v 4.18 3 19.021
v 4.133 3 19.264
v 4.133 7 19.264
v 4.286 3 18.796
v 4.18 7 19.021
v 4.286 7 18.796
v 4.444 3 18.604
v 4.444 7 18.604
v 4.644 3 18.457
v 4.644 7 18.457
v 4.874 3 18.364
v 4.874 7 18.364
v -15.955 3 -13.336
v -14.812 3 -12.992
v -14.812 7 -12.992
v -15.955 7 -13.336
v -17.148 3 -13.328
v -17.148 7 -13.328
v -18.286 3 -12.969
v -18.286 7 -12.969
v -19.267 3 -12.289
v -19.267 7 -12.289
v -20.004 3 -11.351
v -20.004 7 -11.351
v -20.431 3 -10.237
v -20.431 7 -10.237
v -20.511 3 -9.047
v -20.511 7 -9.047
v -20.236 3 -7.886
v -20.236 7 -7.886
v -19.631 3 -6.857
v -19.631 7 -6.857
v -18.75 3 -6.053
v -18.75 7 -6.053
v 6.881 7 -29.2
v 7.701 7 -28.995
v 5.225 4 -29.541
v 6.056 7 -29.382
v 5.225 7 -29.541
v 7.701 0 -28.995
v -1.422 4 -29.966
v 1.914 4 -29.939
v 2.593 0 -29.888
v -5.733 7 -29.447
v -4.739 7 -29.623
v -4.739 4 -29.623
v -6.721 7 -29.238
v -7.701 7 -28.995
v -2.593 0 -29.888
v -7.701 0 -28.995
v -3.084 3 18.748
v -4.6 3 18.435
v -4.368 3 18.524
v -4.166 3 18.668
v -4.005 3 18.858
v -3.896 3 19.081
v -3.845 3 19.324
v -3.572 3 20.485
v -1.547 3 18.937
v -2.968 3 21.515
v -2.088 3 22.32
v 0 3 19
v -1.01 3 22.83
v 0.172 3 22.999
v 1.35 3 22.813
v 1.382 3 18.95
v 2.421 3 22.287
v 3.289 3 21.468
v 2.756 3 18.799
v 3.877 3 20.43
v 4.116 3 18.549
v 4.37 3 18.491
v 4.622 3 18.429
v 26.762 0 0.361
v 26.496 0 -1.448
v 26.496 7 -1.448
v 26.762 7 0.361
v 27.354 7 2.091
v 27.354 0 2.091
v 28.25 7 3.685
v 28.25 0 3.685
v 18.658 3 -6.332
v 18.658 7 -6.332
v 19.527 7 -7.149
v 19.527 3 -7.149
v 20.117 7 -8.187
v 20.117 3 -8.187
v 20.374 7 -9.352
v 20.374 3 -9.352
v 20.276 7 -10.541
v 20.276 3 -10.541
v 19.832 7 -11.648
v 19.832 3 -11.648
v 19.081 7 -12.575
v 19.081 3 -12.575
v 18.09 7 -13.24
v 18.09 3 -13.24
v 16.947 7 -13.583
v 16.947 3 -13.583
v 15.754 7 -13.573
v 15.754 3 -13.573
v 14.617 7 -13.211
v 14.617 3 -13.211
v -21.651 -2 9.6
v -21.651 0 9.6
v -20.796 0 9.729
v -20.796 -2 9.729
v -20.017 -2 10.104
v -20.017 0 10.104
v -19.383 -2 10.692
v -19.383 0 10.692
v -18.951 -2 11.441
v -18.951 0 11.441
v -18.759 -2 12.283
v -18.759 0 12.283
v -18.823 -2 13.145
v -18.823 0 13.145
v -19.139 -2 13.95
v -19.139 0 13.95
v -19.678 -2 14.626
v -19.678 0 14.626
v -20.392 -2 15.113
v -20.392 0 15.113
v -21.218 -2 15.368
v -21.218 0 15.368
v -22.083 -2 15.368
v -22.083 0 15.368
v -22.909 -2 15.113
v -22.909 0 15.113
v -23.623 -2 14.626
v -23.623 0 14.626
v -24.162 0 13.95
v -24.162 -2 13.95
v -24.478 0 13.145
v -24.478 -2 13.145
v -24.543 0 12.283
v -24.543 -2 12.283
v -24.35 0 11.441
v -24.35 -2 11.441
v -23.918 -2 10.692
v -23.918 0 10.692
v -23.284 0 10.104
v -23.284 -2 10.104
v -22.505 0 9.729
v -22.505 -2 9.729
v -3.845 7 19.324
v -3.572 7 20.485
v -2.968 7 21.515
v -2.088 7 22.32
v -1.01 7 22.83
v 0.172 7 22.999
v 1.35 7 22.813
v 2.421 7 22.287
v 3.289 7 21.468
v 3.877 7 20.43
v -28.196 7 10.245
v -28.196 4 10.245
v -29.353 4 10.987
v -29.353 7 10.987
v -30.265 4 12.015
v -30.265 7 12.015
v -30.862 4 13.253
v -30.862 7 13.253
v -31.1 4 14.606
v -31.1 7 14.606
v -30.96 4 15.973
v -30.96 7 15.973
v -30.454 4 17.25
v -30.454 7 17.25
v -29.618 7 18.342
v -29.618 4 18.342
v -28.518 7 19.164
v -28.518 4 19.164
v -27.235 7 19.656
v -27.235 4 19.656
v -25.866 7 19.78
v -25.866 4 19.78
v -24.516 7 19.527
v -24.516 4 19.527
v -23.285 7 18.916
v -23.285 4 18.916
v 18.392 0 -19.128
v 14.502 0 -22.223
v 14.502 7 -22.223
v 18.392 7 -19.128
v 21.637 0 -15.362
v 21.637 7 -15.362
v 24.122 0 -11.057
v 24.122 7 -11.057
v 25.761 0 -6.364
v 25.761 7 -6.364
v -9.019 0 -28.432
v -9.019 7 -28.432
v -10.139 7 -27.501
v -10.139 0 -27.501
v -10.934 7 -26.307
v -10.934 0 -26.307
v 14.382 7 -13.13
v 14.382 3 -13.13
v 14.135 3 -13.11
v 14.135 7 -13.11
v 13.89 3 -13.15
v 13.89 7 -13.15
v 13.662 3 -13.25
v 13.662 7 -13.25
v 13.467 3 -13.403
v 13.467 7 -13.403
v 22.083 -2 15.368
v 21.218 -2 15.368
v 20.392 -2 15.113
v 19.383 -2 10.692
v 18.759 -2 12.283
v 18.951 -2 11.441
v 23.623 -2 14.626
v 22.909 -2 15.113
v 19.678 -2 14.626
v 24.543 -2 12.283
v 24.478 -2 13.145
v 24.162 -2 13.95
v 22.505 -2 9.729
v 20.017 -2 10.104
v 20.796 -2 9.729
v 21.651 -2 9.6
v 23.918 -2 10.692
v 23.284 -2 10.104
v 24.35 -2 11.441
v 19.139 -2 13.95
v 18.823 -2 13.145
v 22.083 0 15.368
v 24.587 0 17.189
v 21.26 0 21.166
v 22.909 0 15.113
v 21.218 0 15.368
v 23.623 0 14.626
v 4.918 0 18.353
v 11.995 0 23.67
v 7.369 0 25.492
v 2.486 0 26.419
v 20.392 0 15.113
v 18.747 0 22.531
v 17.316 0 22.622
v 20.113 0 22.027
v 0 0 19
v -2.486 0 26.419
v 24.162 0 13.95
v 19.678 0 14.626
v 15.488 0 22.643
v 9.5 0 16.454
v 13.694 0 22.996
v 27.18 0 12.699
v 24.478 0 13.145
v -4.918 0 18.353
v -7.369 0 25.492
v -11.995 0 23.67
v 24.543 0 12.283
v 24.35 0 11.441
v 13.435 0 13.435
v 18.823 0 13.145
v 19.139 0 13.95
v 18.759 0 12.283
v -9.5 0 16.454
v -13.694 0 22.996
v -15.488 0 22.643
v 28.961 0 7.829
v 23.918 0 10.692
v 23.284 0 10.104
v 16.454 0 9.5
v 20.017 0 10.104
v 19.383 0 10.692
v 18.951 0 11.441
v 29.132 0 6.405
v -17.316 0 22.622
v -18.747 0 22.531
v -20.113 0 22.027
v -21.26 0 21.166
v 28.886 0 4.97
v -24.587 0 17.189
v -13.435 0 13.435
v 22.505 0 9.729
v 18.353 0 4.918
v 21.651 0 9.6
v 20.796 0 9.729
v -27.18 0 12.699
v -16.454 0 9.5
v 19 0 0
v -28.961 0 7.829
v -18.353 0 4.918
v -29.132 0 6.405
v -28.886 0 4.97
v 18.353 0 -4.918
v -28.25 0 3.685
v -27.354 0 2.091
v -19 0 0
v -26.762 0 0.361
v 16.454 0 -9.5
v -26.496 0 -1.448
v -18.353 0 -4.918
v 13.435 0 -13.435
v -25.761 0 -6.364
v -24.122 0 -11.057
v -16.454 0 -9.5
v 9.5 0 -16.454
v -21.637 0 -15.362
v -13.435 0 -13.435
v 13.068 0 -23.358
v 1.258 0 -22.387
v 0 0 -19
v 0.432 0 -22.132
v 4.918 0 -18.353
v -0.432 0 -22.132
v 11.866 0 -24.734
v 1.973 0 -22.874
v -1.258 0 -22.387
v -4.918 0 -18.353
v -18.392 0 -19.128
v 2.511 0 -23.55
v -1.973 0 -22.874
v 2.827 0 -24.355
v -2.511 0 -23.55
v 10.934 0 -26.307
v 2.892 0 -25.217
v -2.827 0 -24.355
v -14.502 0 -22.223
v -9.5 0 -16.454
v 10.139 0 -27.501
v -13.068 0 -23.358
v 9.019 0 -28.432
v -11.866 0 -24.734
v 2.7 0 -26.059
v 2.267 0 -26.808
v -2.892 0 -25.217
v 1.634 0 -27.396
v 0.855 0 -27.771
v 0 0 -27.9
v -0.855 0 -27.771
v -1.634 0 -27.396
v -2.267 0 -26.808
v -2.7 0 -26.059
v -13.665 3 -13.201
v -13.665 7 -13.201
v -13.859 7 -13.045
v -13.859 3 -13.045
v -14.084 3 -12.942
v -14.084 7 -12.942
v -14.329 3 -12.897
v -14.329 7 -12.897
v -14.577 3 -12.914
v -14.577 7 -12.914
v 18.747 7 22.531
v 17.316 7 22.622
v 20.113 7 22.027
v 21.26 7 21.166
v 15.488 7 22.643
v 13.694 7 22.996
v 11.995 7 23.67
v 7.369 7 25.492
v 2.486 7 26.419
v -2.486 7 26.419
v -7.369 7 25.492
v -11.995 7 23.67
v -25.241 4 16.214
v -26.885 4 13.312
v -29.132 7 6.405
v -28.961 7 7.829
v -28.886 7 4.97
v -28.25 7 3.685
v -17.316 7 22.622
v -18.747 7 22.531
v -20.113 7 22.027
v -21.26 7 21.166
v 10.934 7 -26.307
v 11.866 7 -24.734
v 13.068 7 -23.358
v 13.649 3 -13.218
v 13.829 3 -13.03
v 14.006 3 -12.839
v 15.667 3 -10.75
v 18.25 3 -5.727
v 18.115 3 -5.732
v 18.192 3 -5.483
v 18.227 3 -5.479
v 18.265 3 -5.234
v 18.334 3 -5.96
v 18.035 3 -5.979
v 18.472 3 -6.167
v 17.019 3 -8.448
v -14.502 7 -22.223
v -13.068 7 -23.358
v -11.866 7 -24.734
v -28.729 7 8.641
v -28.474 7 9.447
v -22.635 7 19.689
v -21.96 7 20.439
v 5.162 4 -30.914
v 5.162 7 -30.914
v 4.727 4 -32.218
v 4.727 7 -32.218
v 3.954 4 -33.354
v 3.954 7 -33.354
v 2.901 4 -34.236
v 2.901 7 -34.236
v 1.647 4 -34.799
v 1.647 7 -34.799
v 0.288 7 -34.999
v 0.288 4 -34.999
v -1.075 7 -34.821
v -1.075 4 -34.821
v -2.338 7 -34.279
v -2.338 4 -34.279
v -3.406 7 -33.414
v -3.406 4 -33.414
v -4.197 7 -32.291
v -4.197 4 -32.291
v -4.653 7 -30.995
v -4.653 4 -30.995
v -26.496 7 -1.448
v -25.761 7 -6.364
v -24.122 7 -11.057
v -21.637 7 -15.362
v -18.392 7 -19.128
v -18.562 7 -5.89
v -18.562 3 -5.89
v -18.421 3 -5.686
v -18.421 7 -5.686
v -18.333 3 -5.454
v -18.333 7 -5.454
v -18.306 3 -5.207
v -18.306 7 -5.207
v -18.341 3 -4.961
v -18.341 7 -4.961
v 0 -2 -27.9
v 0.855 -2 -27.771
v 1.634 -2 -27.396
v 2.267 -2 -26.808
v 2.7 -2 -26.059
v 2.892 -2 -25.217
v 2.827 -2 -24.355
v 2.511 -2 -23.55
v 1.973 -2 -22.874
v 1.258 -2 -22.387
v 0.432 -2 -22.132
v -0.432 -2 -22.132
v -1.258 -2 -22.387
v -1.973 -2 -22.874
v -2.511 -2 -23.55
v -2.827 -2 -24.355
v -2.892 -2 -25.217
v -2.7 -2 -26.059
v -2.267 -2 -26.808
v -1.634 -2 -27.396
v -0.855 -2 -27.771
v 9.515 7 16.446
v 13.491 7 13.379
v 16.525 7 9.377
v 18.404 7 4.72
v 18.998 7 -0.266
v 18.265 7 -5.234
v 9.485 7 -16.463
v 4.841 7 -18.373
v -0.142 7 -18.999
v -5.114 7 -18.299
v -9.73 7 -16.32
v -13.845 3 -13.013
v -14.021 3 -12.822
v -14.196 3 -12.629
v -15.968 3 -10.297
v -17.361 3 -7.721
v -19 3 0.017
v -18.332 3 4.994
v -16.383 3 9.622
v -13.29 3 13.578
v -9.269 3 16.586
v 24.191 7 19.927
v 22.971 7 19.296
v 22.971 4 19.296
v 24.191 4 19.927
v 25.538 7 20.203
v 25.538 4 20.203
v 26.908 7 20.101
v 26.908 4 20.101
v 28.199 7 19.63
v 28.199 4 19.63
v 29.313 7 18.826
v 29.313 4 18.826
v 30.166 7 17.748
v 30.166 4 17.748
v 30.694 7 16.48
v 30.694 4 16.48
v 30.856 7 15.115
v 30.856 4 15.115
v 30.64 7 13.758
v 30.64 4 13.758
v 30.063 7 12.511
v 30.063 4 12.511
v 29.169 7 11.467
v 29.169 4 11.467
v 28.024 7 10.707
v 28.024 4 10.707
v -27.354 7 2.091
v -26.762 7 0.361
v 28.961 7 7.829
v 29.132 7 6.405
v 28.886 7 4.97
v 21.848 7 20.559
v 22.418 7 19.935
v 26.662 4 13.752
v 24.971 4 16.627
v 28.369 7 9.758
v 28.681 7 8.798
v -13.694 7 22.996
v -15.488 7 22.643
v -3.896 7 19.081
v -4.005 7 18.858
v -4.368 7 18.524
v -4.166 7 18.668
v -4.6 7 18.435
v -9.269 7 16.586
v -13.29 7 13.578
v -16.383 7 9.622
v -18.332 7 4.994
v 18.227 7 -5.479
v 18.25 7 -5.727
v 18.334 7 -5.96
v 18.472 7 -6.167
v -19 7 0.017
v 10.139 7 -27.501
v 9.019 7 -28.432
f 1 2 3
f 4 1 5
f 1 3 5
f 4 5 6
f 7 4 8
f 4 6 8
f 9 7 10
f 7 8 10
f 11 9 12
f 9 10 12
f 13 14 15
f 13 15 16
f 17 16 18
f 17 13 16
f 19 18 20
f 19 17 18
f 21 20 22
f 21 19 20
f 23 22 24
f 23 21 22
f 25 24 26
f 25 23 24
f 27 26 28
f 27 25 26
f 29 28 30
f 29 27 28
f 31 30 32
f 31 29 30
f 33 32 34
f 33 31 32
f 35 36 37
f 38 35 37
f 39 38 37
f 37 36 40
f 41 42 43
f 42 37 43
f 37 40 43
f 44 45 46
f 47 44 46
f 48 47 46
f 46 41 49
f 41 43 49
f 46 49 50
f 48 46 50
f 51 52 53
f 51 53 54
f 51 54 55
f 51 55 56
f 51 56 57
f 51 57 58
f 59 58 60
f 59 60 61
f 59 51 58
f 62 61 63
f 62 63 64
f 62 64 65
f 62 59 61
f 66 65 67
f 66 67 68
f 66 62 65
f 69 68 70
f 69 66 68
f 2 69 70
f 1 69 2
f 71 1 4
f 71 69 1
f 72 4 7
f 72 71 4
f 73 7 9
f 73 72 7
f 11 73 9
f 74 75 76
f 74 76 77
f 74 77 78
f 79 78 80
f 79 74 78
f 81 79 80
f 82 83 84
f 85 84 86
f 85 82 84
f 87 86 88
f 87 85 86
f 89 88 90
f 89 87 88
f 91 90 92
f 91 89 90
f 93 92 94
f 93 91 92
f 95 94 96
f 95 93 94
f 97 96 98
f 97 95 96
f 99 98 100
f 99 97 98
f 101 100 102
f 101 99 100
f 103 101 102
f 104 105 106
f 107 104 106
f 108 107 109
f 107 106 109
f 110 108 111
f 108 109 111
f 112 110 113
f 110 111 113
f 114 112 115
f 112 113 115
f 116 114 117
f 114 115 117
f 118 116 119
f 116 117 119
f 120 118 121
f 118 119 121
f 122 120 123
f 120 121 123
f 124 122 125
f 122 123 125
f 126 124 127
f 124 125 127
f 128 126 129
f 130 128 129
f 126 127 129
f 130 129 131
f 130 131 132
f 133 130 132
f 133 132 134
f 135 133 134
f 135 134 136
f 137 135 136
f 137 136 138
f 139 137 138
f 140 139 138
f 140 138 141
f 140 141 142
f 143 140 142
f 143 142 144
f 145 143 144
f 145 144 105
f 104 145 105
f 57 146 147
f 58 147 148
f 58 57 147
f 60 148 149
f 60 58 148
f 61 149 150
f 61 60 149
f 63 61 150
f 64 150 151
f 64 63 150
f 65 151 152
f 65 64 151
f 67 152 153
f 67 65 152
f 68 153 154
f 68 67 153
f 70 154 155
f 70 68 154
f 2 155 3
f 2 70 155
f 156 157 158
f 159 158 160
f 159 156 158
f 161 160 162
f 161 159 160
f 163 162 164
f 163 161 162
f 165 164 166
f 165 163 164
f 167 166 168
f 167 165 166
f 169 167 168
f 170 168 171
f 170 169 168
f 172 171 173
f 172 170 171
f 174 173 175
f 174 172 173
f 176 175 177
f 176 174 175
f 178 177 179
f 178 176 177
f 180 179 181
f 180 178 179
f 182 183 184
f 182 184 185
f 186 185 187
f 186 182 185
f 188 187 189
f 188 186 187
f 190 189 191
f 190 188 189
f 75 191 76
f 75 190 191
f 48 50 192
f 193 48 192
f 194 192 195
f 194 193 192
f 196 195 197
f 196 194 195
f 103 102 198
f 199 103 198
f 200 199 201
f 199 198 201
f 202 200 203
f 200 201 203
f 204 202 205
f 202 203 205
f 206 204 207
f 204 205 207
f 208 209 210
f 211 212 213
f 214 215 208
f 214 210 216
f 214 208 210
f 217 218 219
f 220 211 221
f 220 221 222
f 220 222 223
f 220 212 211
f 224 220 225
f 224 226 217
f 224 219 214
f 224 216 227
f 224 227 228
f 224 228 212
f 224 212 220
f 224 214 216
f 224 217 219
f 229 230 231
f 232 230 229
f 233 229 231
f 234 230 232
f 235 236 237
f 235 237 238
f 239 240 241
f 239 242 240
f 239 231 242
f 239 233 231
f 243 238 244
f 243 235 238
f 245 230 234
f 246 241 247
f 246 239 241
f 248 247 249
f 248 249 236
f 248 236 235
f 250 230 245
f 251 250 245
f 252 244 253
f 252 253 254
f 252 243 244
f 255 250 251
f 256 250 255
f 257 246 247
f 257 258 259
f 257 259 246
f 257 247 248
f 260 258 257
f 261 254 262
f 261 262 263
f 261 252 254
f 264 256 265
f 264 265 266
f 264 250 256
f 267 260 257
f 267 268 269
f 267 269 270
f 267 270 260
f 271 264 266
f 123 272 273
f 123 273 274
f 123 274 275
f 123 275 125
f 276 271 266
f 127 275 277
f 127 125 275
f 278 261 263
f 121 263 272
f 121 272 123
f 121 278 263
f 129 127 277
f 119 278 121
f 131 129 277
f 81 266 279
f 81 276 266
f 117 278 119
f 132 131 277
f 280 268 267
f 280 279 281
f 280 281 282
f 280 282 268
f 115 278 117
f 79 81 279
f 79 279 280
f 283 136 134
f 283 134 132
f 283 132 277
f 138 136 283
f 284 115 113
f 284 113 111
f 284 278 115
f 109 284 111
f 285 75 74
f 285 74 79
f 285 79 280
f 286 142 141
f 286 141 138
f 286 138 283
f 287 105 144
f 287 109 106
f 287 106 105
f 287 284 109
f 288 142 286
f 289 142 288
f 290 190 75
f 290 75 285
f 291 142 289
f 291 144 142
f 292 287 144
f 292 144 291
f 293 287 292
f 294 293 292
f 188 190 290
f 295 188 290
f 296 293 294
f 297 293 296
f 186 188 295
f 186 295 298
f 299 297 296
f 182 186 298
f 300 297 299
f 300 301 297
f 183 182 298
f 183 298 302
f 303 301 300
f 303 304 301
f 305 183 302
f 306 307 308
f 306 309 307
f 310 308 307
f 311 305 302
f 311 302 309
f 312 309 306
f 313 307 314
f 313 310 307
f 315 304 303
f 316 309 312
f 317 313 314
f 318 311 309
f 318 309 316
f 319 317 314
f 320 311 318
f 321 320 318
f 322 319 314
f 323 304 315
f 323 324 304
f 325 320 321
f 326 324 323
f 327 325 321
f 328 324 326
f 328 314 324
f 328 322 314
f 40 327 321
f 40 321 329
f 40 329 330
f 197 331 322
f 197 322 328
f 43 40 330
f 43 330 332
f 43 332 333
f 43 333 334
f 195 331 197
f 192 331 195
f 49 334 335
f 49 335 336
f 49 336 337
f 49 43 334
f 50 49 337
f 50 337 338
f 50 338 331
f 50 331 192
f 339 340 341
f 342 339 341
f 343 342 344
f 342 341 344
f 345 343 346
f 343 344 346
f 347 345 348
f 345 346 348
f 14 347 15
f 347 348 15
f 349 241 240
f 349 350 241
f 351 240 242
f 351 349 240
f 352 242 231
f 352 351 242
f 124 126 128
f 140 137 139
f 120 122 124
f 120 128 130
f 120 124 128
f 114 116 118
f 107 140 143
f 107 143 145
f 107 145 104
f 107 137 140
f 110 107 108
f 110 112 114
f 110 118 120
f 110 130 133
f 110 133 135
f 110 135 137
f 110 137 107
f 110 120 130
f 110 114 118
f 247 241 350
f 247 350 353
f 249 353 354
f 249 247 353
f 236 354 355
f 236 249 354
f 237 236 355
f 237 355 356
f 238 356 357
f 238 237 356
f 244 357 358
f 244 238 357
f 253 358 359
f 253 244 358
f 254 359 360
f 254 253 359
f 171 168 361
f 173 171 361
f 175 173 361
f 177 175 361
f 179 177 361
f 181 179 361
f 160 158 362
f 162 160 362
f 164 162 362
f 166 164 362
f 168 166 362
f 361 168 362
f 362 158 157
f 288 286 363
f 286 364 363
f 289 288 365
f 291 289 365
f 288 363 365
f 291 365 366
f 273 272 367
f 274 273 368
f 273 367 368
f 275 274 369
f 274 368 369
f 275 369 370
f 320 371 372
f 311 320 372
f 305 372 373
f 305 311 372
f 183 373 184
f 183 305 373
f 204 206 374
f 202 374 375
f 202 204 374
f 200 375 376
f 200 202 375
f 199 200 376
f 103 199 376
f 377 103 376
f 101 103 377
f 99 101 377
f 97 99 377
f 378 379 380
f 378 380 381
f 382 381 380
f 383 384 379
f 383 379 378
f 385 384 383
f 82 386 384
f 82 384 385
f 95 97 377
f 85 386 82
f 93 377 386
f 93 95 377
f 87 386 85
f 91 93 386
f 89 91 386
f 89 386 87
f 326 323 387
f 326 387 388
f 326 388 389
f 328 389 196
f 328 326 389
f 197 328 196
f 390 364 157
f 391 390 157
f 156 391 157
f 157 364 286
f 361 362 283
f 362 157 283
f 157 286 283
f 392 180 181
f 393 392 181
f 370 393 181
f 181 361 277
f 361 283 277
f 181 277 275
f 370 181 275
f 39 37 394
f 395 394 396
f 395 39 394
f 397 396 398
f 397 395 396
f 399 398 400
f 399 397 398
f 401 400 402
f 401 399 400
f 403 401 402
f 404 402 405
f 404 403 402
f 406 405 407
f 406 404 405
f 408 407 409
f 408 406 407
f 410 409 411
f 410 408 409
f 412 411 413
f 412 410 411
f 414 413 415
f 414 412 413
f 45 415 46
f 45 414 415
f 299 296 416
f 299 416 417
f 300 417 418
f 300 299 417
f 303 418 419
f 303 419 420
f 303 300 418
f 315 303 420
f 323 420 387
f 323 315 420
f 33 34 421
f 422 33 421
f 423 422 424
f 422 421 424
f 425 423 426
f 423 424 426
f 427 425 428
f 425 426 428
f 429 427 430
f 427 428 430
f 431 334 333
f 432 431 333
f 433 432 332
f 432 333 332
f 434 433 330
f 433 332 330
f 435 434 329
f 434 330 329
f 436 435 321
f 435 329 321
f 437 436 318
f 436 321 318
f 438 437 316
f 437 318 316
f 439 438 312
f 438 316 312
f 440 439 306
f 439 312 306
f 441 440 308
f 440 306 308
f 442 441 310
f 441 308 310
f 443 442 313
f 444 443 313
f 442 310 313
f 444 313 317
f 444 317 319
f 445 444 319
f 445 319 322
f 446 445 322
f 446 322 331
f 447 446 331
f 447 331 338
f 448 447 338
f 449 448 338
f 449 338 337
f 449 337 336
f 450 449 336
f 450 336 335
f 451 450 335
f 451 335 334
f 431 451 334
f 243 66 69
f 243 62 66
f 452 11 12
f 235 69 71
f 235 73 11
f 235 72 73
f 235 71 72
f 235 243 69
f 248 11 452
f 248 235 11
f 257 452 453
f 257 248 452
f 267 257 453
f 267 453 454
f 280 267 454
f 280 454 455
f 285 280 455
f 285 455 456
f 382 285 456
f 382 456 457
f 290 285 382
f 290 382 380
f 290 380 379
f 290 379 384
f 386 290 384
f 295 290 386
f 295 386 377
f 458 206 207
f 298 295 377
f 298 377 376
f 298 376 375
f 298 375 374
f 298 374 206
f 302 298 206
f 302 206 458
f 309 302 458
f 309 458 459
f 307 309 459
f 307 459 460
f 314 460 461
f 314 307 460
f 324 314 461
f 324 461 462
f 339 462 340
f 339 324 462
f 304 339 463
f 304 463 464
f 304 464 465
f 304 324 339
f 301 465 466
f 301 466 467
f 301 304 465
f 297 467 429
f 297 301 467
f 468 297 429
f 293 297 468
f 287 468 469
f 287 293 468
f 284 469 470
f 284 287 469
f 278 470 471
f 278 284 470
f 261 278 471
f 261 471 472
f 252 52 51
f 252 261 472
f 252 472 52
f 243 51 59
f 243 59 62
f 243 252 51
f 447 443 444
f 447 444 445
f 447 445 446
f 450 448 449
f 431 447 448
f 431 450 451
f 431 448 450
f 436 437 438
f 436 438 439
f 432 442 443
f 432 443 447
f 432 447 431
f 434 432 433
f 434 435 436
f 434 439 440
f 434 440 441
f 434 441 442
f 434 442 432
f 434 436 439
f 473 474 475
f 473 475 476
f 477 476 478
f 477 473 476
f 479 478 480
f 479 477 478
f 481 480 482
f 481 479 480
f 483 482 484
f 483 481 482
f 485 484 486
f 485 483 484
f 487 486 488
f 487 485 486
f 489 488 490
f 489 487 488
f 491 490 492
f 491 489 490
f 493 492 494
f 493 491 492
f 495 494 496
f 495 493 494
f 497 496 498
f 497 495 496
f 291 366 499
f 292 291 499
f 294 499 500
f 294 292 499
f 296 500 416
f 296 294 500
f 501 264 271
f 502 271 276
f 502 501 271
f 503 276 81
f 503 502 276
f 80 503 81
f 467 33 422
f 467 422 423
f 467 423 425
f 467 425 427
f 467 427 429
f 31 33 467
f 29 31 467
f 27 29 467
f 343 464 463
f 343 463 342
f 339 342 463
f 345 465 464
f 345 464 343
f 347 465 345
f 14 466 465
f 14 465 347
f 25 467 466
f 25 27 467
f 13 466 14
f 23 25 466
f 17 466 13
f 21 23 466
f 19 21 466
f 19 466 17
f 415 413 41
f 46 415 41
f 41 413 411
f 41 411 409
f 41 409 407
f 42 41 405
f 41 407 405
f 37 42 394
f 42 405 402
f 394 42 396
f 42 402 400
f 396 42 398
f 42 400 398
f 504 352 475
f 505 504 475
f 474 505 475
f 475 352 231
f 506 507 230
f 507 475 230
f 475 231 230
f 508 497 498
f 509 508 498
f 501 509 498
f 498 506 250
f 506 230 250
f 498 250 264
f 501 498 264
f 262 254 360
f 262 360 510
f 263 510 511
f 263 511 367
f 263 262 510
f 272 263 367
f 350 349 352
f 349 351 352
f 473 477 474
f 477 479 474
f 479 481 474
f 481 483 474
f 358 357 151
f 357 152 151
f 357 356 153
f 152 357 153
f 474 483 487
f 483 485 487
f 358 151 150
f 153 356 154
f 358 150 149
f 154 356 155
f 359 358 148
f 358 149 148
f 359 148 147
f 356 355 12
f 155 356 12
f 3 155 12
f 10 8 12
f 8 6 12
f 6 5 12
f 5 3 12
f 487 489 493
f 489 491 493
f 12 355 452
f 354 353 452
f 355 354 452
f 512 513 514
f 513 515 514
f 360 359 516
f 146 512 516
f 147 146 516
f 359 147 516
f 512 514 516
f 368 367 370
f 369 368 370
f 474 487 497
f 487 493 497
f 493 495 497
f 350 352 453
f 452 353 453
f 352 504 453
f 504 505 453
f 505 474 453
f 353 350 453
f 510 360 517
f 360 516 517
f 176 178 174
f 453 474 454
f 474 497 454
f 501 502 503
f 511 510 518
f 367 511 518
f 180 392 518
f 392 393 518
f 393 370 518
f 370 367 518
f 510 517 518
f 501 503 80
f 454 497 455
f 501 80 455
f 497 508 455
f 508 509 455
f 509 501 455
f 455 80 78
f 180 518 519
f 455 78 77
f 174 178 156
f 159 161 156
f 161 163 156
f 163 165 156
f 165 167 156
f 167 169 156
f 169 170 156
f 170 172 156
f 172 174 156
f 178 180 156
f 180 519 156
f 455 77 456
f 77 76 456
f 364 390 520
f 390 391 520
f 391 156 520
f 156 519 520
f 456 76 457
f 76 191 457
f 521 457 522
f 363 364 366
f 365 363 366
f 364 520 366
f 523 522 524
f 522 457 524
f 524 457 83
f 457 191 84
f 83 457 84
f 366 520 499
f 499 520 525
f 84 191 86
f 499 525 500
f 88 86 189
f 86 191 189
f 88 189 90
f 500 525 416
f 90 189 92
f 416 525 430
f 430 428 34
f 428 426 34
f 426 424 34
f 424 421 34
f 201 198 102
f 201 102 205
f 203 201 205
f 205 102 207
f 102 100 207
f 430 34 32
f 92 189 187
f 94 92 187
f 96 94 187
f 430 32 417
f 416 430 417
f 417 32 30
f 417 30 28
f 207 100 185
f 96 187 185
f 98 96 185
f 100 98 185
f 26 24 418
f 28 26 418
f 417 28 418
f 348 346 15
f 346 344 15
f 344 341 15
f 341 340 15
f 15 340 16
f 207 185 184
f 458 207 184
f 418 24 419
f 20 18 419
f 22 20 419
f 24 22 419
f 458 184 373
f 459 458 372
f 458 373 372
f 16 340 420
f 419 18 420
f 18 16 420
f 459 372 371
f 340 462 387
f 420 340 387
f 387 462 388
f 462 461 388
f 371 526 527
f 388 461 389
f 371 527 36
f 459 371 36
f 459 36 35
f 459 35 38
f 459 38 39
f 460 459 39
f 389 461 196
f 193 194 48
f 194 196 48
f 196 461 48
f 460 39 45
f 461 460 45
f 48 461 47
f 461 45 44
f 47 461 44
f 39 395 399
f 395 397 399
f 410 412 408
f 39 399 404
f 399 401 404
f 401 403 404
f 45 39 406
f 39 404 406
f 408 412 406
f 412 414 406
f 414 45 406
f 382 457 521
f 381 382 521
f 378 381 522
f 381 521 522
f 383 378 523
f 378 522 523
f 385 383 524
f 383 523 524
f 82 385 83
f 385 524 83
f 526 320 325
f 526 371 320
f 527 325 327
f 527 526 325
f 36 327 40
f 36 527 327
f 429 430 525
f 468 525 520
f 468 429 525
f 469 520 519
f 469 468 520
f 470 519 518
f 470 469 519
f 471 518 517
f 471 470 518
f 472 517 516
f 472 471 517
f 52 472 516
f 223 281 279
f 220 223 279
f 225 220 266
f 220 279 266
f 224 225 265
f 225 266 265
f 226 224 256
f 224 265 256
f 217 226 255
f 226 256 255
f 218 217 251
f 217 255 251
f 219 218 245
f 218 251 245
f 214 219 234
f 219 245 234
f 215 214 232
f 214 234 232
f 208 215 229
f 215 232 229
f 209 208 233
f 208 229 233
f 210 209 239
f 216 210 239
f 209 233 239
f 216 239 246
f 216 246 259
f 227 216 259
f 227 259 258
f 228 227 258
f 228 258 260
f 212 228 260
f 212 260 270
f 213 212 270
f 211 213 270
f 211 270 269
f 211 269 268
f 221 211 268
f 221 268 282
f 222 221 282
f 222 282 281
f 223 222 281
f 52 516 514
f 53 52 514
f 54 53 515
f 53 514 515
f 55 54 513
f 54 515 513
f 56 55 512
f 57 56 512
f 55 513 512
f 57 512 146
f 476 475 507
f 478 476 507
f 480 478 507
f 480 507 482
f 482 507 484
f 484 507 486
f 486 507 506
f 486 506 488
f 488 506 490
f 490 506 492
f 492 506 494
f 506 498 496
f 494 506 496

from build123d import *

# Parameters (mm, degrees)
SKETCH1_R                = 19
BOSS_EXTRUDE1_DEPTH      = 3.5
SKETCH2_R                = 30
SKETCH2_R_2              = 19
SKETCH2_R_3              = 2.8
BOSS_EXTRUDE2_DEPTH      = 7
BOSS_EXTRUDE3_DEPTH      = 2
BOSS_EXTRUDE3_DEPTH_BACK = 7
SKETCH4_R                = 2.9
SKETCH5_R                = 5
BOSS_EXTRUDE4_DEPTH      = 3
CUT_EXTRUDE1_START       = -10
SKETCH3_R                = 19
CUT_EXTRUDE1_DEPTH       = 10
CUT_EXTRUDE3_START       = -13
CUT_EXTRUDE3_DEPTH       = 13
FILLET1_R                = 10
FILLET2_R                = 5
CUT_EXTRUDE4_START       = -4
SKETCH8_R                = 4
SKETCH8_R_2              = 19
CUT_EXTRUDE4_DEPTH       = 4
FILLET3_R                = 1


with BuildPart() as part:
    # Sketch1 → Boss-Extrude1 (new body)
    with BuildSketch(Plane(origin=(0, 0, 0), x_dir=(1, 0, 0), z_dir=(0, 1, 0))):
        with Locations(Location((0, 0, 0), (0, 0, 270))):
            Circle(SKETCH1_R)
    extrude(amount=BOSS_EXTRUDE1_DEPTH)

    # Sketch2 → Boss-Extrude2 (add)
    with BuildSketch(Plane(origin=(0, 0, 0), x_dir=(1, 0, 0), z_dir=(0, 1, 0))):
        with Locations(Location((0, 0, 0), (0, 0, 270))):
            Circle(SKETCH2_R)
        with Locations(Location((0, 0, 0), (0, 0, 270))):
            Circle(SKETCH2_R_2, mode=Mode.SUBTRACT)
        with Locations(Location((0, 25, 0), (0, 0, 270))):
            Circle(SKETCH2_R_3, mode=Mode.SUBTRACT)
        with Locations(Location((21.650635095, -12.5, 0), (0, 0, 270))):
            Circle(SKETCH2_R_3, mode=Mode.SUBTRACT)
        with Locations(Location((-21.650635095, -12.5, 0), (0, 0, 270))):
            Circle(SKETCH2_R_3, mode=Mode.SUBTRACT)
    extrude(amount=BOSS_EXTRUDE2_DEPTH)

    # Sketch4 → Boss-Extrude3 (add, two sides: drawn at the far end of the back side and taken through both)
    with BuildSketch(Plane.XZ.offset(-BOSS_EXTRUDE3_DEPTH_BACK)):
        with Locations(Location((-21.650635095, 12.5, 0), (0, 0, 270))):
            Circle(SKETCH4_R)
        with Locations(Location((21.650635095, 12.5, 0), (0, 0, 270))):
            Circle(SKETCH4_R)
        with Locations(Location((0, -25, 0), (0, 0, 270))):
            Circle(SKETCH4_R)
    extrude(amount=BOSS_EXTRUDE3_DEPTH + BOSS_EXTRUDE3_DEPTH_BACK)

    # Sketch5 → Boss-Extrude4 (add)
    with BuildSketch(Plane(origin=(0, 7, 0), x_dir=(1, 0, 0), z_dir=(0, 1, 0))):
        with Locations((-26.103110985, -14.7860609)):
            Circle(SKETCH5_R)
        with Locations((0.246451131, 29.99898768)):
            Circle(SKETCH5_R)
        with Locations((25.856659853, -15.212926781)):
            Circle(SKETCH5_R)
    extrude(amount=-BOSS_EXTRUDE4_DEPTH)

    # Sketch3 → Cut-Extrude1 (cut)
    with BuildSketch(Plane(origin=(0, 3.5, 0), x_dir=(1, 0, 0), z_dir=(0, 1, 0)).offset(CUT_EXTRUDE1_START)):
        with Locations(Location((0, 0, 0), (0, 0, 270))):
            Circle(SKETCH3_R)
    extrude(amount=CUT_EXTRUDE1_DEPTH, mode=Mode.SUBTRACT)

    # Sketch7 → Cut-Extrude3 (cut)
    with BuildSketch(Plane(origin=(0, 7, 0), x_dir=(1, 0, 0), z_dir=(0, 1, 0)).offset(CUT_EXTRUDE3_START)):
        with BuildLine():
            ThreePointArc((-29.54423259, -5.20944533), (-25.980762114, 15), (-10.2606043, 28.190778624))
            Line((-10.2606043, 28.190778624), (-13.773984089, 37.84371026))
            Line((-13.773984089, 37.84371026), (-43.939319858, -7.747687605))
            Line((-43.939319858, -7.747687605), (-29.54423259, -5.20944533))
        make_face()
        with BuildLine():
            ThreePointArc((-26.13264562, -4.6078905), (-22.980662881, 13.267891901), (-9.075772579, 24.935480225))
            Line((-9.075772579, 24.935480225), (-10.2606043, 28.190778624))
            ThreePointArc((-10.2606043, 28.190778624), (-25.980762114, 15), (-29.54423259, -5.20944533))
            Line((-29.54423259, -5.20944533), (-26.13264562, -4.6078905))
        make_face()
        with BuildLine():
            Line((15.259965643, 41.926411025), (10.2606043, 28.190778624))
            ThreePointArc((10.2606043, 28.190778624), (25.980762114, 15), (29.54423259, -5.20944533))
            Line((29.54423259, -5.20944533), (39.660606503, -6.993234998))
            Line((39.660606503, -6.993234998), (15.259965643, 41.926411025))
        make_face()
        with BuildLine():
            Line((10.2606043, 28.190778624), (9.075772579, 24.935480225))
            ThreePointArc((9.075772579, 24.935480225), (21.736841548, 15.220300308), (26.535783801, 0))
            ThreePointArc((26.535783801, 0), (26.434807132, -2.312745947), (26.13264562, -4.6078905))
            Line((26.13264562, -4.6078905), (29.54423259, -5.20944533))
            ThreePointArc((29.54423259, -5.20944533), (25.980762114, 15), (10.2606043, 28.190778624))
        make_face()
        with BuildLine():
            Line((28.679354216, -34.17872342), (19.283628291, -22.981333294))
            ThreePointArc((19.283628291, -22.981333294), (0, -30), (-19.283628291, -22.981333294))
            Line((-19.283628291, -22.981333294), (-25.886622414, -30.850475262))
            Line((-25.886622414, -30.850475262), (28.679354216, -34.17872342))
        make_face()
        with BuildLine():
            Line((19.283628291, -22.981333294), (17.056873041, -20.327589725))
            ThreePointArc((17.056873041, -20.327589725), (0, -26.535783801), (-17.056873041, -20.327589725))
            Line((-17.056873041, -20.327589725), (-19.283628291, -22.981333294))
            ThreePointArc((-19.283628291, -22.981333294), (0, -30), (19.283628291, -22.981333294))
        make_face()
    extrude(amount=CUT_EXTRUDE3_DEPTH, mode=Mode.SUBTRACT)

    # Fillet1
    # the kernel refuses this fillet: 10 mm, written as the material it adds along each edge
    with BuildSketch(Plane(origin=(-26.13264562, 0, 4.6078905), x_dir=(-0.9848077530122318, 0, 0.17364817766679624), z_dir=(0, 1, 0)), Plane(origin=(17.056873041, 0, 20.327589725), x_dir=(0.6427876096865569, 0, 0.7660444431189634), z_dir=(0, 1, 0)), Plane(origin=(9.075772579, 0, -24.935480225), x_dir=(0.34202014332561265, 0, -0.9396926207859289), z_dir=(0, 1, 0))) as fillet1_piece_1:
        with BuildLine():
            CenterArc((9.045274498, -8.297697769), FILLET1_R, 123.92490422, 42.948020906)
            Line((-0.693413056, -6.026582466), (-0.888186807, -5.98116016))
            ThreePointArc((-0.888186807, -5.98116016), (-0.372612378, -3.01031053), (-0.2, 0))
            Line((-0.2, 0), (0, 0.2))
            ThreePointArc((0, 0.2), (1.732108099, 0.2), (3.352595033, 0.165953955))
            Line((3.352595033, 0.165953955), (3.464216199, 0))
        make_face()
    extrude(amount=7)
    with BuildSketch(Plane(origin=(-17.056873041, 0, 20.327589725), x_dir=(0.8344973728156843, 0, 0.551011918894429), z_dir=(0, 1, 0)), Plane(origin=(26.13264562, 0, 4.6078905), x_dir=(0.059941633142754296, 0, -0.99820188369697), z_dir=(0, 1, 0)), Plane(origin=(-9.075772579, 0, -24.935480225), x_dir=(-0.8944390059584274, 0, 0.44718996480254386), z_dir=(0, 1, 0))) as fillet1_piece_2:
        with BuildLine():
            CenterArc((7.20939257, -9.934457095), FILLET1_R, 96.563537437, 42.948020906)
            Line((-0.39597707, -3.441510719), (-0.548084463, -3.311651792))
            ThreePointArc((-0.548084463, -3.311651792), (-0.396677677, -1.697894369), (-0.198689142, 0.022860991))
            Line((-0.198689142, 0.022860991), (0.022860991, 0.198689142))
            ThreePointArc((0.022860991, 0.198689142), (3.03317152, 0.026076764), (6.04348205, 0.198689142))
            Line((6.04348205, 0.198689142), (6.06634304, 0))
        make_face()
    extrude(amount=7)

    # Fillet2
    fillet2_edges = [part.edges().sort_by_distance(p)[0] for p in [
        (-10.2606043, 3.5, -28.190778624),
        (-29.54423259, 3.5, 5.20944533),
        (-19.283628291, 3.5, 22.981333294),
        (19.283628291, 3.5, 22.981333294),
        (29.54423259, 3.5, 5.20944533),
        (10.2606043, 3.5, -28.190778624),
    ]]
    fillet(fillet2_edges, radius=FILLET2_R)

    # Sketch8 → Cut-Extrude4 (cut)
    with BuildSketch(Plane(origin=(0, 7, 0), x_dir=(1, 0, 0), z_dir=(0, 1, 0)).offset(CUT_EXTRUDE4_START)):
        with Locations((-16.524893724, 9.376987118)):
            Circle(SKETCH8_R)
        with Locations(Location((0, 0, 0), (0, 0, 42.512080704))):
            Circle(SKETCH8_R_2)
        with Locations((16.383155917, 9.622484201)):
            Circle(SKETCH8_R)
        with Locations((0.141737807, -18.999471319)):
            Circle(SKETCH8_R)
    extrude(amount=CUT_EXTRUDE4_DEPTH, mode=Mode.SUBTRACT)

    # Fillet3
    # the kernel refuses this fillet: 1 mm, written as the material it takes off along each edge
    with BuildSketch(Plane(origin=(-14.195555863, 8.950278825, -12.628784333), x_dir=(-0.8617980531882996, 0, -0.5072515308216002), z_dir=(0, -1, 0)), Plane(origin=(18.034625983, 8.950278825, -5.979319831), x_dir=(0.8701917383942803, 0, -0.49271324158209956), z_dir=(0, -1, 0))) as fillet3_piece_1:
        with BuildLine():
            CenterArc((0.805364366, 0.995988176), FILLET3_R, 193.528948716, 71.337075115)
            ThreePointArc((-0.166887482, 0.762051552), (-0.079532242, 0.381882385), (0, 0))
            ThreePointArc((0, 0), (0.357939718, 0.016047295), (0.715879437, 0))
        make_face()
    extrude(amount=5.950278825, mode=Mode.SUBTRACT)
    with BuildSketch(Plane(origin=(-18.121826323, 8.950278825, -5.709589366), x_dir=(-0.28086097725665193, 0, 0.9597484625955065), z_dir=(0, -1, 0)), Plane(origin=(14.005562597, 8.950278825, -12.839167276), x_dir=(-0.6907360612225409, 0, -0.7231069725336425), z_dir=(0, -1, 0))) as fillet3_piece_2:
        with BuildLine():
            CenterArc((0.800640781, 0.999789253), FILLET3_R, 197.486602821, 71.337075115)
            ThreePointArc((-0.153146456, 0.699306464), (-0.060897436, 0.353086193), (0, 0))
            ThreePointArc((0, 0), (0.390055765, 0.004004198), (0.78011153, 0))
        make_face()
    extrude(amount=5.950278825, mode=Mode.SUBTRACT)
    with BuildSketch(Plane(origin=(-3.83907012, 8.950278825, 18.608104165), x_dir=(-0.9750194381231715, 0, -0.22211955177780904), z_dir=(0, -1, 0))) as fillet3_piece_3:
        with BuildLine():
            CenterArc((0.800640781, -0.999789253), FILLET3_R, 91.176322064, 71.337075115)
            ThreePointArc((-0.153146456, -0.699306464), (-0.060897436, -0.353086193), (0, 0))
            ThreePointArc((0, 0), (0.390055765, -0.004004198), (0.78011153, 0))
        make_face()
    extrude(amount=5.950278825, mode=Mode.SUBTRACT)
    with BuildSketch(Plane(origin=(4.116263726, 8.950278825, 18.548756641), x_dir=(0.023311579398747933, 0, 0.9997282482084497), z_dir=(0, -1, 0))) as fillet3_piece_4:
        with BuildLine():
            CenterArc((0.805364366, -0.995988176), FILLET3_R, 95.133976169, 71.337075115)
            ThreePointArc((-0.166887482, -0.762051552), (-0.079532242, -0.381882385), (0, 0))
            ThreePointArc((0, 0), (0.357939718, -0.016047295), (0.715879437, 0))
        make_face()
    extrude(amount=5.950278825, mode=Mode.SUBTRACT)


solid = part.part
